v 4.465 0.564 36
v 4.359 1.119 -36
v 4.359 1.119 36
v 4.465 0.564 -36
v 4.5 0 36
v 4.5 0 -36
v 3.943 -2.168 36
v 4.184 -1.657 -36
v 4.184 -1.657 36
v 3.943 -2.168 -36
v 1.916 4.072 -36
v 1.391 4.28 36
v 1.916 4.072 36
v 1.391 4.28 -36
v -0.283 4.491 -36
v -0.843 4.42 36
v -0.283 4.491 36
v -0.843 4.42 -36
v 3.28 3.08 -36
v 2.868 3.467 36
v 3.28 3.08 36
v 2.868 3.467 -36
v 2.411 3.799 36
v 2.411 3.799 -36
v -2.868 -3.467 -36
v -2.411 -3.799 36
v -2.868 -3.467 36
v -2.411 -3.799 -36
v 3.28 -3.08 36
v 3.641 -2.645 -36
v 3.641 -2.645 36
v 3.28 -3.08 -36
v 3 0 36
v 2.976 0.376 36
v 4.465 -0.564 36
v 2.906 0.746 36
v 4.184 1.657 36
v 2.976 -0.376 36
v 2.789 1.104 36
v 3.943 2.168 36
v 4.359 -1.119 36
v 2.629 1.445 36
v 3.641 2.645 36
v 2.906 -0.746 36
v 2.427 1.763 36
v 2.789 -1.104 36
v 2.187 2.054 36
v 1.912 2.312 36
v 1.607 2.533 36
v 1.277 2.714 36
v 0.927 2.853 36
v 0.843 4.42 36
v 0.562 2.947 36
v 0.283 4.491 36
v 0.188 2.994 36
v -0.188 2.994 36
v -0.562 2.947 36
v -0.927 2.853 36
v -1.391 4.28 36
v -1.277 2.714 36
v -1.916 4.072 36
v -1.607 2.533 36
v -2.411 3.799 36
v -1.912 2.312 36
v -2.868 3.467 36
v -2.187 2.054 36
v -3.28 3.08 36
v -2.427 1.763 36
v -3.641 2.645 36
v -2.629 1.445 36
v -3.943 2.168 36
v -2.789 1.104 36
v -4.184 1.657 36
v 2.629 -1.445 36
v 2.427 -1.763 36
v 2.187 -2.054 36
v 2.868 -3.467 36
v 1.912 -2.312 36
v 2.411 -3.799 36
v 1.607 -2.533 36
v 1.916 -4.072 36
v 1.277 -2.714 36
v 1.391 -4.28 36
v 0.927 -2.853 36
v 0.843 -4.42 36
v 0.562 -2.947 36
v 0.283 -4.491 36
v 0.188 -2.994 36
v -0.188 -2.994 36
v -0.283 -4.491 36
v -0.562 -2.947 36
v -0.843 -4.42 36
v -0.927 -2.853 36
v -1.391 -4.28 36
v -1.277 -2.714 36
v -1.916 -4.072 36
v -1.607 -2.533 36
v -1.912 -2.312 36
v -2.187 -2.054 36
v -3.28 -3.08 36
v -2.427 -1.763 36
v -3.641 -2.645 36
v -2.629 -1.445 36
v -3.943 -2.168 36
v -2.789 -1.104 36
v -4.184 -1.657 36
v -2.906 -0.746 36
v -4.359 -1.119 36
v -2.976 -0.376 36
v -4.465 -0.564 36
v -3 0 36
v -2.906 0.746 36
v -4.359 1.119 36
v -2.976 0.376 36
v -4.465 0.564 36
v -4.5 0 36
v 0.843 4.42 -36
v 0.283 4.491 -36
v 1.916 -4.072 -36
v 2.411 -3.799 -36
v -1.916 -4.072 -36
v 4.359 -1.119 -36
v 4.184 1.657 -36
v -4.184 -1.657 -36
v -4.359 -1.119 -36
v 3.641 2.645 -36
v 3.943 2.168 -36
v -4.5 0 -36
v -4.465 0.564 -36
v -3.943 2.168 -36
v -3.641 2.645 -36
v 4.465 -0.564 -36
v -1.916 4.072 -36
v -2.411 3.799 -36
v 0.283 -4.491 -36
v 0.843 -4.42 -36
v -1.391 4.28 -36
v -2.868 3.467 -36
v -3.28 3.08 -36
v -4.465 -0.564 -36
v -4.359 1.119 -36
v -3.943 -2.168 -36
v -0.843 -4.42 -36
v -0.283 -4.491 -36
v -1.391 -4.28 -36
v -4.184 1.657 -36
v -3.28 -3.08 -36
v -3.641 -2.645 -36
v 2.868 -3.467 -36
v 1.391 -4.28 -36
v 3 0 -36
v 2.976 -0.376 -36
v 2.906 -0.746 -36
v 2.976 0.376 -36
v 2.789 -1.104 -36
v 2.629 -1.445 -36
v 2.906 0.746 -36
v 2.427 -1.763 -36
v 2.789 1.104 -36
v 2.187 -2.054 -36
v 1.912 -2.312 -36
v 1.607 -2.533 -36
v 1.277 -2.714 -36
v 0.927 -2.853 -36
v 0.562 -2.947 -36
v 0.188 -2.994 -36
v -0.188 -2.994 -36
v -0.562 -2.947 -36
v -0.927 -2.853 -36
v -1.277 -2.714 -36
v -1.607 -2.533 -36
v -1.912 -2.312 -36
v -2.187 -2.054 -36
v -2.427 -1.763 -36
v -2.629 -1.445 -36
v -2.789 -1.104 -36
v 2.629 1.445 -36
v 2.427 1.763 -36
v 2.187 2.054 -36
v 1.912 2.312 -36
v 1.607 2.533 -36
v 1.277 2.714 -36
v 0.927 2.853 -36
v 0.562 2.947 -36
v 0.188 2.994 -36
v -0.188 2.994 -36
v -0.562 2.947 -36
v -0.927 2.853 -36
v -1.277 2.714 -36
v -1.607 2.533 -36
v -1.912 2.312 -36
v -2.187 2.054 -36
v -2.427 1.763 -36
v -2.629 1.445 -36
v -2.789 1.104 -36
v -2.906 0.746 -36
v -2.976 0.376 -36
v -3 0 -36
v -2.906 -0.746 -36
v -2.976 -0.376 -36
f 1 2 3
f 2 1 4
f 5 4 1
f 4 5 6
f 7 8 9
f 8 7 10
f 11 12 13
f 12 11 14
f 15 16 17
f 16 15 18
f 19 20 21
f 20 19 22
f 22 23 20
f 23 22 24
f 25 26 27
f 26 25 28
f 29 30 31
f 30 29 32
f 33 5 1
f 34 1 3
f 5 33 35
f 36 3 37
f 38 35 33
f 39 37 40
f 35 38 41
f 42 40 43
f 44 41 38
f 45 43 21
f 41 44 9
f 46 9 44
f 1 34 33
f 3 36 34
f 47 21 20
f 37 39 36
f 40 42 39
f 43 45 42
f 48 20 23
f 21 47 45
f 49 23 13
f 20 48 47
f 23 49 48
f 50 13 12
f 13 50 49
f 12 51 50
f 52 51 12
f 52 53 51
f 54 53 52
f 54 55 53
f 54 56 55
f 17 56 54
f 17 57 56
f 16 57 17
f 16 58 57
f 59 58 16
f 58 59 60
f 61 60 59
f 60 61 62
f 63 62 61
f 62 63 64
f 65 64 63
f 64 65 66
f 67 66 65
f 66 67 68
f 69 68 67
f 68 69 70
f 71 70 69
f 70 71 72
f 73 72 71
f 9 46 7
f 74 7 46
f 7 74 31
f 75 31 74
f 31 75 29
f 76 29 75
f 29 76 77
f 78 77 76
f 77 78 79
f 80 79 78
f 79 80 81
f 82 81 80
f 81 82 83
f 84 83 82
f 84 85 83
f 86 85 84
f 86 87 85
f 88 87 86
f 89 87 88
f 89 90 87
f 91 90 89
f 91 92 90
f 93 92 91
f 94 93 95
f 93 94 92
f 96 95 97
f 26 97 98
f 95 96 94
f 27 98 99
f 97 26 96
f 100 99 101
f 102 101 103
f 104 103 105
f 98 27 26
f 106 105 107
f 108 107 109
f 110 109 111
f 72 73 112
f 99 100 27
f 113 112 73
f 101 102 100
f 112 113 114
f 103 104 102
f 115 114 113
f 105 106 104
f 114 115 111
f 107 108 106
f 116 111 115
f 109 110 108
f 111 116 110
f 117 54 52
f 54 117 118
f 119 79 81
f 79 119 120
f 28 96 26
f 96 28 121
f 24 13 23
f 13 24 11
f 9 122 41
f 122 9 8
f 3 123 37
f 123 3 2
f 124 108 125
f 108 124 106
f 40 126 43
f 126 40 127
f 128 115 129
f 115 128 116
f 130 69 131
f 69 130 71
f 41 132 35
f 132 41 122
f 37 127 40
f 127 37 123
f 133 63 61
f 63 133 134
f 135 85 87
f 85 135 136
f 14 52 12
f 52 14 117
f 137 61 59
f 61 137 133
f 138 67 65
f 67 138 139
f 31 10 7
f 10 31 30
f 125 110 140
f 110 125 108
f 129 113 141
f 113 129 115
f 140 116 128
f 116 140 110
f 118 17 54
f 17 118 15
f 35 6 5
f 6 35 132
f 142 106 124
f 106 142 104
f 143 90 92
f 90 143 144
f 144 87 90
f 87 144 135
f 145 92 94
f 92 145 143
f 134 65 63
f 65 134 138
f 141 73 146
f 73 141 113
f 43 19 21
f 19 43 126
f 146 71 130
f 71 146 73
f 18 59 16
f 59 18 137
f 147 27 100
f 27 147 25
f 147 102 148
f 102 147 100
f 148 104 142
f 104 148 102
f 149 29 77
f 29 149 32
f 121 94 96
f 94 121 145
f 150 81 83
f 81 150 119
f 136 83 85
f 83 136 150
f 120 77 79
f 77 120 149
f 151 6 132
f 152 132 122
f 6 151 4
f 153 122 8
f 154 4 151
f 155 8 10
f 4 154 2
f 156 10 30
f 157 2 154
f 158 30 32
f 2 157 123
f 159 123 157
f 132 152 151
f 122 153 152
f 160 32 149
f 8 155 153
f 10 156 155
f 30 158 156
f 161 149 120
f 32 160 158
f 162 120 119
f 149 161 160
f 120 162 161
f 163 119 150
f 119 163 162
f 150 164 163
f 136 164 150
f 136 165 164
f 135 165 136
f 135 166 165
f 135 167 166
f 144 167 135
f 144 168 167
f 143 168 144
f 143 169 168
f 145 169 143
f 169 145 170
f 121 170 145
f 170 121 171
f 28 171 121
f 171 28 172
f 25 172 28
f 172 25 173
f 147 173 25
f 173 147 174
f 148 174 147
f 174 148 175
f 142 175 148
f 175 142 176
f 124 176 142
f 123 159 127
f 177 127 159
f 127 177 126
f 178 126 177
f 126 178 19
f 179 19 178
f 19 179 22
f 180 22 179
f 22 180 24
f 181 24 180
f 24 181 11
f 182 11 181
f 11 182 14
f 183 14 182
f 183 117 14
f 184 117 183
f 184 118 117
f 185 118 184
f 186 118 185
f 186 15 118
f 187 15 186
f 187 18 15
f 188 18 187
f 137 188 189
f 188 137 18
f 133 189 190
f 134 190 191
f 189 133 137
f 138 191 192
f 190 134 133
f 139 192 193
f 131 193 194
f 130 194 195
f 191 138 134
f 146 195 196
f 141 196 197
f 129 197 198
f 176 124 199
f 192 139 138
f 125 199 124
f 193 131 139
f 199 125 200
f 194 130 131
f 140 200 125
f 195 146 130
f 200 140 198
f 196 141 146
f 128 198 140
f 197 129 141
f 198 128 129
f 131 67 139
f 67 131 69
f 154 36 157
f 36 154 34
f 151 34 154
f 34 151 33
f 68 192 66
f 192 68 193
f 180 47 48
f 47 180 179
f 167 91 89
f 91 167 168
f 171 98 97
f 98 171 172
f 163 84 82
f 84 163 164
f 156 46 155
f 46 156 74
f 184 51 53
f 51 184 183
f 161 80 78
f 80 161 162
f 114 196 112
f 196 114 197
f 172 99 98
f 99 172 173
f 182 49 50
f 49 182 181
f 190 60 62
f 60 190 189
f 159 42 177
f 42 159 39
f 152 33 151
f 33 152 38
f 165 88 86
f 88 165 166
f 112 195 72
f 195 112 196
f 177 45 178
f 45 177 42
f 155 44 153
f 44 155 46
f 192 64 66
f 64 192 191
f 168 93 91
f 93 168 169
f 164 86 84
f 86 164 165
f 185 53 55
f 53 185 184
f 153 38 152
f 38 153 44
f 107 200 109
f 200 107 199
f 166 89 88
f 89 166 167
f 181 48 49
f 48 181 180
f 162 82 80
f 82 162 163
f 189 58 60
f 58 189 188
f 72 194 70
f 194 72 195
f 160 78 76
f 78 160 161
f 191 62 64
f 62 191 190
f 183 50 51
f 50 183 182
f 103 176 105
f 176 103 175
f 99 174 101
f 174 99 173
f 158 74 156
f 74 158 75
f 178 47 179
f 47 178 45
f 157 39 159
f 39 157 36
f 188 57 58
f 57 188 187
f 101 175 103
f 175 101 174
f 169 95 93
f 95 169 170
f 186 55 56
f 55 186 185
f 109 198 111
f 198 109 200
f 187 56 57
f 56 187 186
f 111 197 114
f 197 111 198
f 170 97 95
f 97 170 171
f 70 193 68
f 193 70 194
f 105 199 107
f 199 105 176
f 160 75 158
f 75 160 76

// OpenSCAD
$fn = 50;


difference() {
	union() {
		translate(v = [0, 0, -36.0000000000]) {
			cylinder(h = 72, r = 4.5000000000);
		}
	}
	union() {
		translate(v = [0, 0, -100.0000000000]) {
			cylinder(h = 200, r = 3.0000000000);
		}
	}
}
